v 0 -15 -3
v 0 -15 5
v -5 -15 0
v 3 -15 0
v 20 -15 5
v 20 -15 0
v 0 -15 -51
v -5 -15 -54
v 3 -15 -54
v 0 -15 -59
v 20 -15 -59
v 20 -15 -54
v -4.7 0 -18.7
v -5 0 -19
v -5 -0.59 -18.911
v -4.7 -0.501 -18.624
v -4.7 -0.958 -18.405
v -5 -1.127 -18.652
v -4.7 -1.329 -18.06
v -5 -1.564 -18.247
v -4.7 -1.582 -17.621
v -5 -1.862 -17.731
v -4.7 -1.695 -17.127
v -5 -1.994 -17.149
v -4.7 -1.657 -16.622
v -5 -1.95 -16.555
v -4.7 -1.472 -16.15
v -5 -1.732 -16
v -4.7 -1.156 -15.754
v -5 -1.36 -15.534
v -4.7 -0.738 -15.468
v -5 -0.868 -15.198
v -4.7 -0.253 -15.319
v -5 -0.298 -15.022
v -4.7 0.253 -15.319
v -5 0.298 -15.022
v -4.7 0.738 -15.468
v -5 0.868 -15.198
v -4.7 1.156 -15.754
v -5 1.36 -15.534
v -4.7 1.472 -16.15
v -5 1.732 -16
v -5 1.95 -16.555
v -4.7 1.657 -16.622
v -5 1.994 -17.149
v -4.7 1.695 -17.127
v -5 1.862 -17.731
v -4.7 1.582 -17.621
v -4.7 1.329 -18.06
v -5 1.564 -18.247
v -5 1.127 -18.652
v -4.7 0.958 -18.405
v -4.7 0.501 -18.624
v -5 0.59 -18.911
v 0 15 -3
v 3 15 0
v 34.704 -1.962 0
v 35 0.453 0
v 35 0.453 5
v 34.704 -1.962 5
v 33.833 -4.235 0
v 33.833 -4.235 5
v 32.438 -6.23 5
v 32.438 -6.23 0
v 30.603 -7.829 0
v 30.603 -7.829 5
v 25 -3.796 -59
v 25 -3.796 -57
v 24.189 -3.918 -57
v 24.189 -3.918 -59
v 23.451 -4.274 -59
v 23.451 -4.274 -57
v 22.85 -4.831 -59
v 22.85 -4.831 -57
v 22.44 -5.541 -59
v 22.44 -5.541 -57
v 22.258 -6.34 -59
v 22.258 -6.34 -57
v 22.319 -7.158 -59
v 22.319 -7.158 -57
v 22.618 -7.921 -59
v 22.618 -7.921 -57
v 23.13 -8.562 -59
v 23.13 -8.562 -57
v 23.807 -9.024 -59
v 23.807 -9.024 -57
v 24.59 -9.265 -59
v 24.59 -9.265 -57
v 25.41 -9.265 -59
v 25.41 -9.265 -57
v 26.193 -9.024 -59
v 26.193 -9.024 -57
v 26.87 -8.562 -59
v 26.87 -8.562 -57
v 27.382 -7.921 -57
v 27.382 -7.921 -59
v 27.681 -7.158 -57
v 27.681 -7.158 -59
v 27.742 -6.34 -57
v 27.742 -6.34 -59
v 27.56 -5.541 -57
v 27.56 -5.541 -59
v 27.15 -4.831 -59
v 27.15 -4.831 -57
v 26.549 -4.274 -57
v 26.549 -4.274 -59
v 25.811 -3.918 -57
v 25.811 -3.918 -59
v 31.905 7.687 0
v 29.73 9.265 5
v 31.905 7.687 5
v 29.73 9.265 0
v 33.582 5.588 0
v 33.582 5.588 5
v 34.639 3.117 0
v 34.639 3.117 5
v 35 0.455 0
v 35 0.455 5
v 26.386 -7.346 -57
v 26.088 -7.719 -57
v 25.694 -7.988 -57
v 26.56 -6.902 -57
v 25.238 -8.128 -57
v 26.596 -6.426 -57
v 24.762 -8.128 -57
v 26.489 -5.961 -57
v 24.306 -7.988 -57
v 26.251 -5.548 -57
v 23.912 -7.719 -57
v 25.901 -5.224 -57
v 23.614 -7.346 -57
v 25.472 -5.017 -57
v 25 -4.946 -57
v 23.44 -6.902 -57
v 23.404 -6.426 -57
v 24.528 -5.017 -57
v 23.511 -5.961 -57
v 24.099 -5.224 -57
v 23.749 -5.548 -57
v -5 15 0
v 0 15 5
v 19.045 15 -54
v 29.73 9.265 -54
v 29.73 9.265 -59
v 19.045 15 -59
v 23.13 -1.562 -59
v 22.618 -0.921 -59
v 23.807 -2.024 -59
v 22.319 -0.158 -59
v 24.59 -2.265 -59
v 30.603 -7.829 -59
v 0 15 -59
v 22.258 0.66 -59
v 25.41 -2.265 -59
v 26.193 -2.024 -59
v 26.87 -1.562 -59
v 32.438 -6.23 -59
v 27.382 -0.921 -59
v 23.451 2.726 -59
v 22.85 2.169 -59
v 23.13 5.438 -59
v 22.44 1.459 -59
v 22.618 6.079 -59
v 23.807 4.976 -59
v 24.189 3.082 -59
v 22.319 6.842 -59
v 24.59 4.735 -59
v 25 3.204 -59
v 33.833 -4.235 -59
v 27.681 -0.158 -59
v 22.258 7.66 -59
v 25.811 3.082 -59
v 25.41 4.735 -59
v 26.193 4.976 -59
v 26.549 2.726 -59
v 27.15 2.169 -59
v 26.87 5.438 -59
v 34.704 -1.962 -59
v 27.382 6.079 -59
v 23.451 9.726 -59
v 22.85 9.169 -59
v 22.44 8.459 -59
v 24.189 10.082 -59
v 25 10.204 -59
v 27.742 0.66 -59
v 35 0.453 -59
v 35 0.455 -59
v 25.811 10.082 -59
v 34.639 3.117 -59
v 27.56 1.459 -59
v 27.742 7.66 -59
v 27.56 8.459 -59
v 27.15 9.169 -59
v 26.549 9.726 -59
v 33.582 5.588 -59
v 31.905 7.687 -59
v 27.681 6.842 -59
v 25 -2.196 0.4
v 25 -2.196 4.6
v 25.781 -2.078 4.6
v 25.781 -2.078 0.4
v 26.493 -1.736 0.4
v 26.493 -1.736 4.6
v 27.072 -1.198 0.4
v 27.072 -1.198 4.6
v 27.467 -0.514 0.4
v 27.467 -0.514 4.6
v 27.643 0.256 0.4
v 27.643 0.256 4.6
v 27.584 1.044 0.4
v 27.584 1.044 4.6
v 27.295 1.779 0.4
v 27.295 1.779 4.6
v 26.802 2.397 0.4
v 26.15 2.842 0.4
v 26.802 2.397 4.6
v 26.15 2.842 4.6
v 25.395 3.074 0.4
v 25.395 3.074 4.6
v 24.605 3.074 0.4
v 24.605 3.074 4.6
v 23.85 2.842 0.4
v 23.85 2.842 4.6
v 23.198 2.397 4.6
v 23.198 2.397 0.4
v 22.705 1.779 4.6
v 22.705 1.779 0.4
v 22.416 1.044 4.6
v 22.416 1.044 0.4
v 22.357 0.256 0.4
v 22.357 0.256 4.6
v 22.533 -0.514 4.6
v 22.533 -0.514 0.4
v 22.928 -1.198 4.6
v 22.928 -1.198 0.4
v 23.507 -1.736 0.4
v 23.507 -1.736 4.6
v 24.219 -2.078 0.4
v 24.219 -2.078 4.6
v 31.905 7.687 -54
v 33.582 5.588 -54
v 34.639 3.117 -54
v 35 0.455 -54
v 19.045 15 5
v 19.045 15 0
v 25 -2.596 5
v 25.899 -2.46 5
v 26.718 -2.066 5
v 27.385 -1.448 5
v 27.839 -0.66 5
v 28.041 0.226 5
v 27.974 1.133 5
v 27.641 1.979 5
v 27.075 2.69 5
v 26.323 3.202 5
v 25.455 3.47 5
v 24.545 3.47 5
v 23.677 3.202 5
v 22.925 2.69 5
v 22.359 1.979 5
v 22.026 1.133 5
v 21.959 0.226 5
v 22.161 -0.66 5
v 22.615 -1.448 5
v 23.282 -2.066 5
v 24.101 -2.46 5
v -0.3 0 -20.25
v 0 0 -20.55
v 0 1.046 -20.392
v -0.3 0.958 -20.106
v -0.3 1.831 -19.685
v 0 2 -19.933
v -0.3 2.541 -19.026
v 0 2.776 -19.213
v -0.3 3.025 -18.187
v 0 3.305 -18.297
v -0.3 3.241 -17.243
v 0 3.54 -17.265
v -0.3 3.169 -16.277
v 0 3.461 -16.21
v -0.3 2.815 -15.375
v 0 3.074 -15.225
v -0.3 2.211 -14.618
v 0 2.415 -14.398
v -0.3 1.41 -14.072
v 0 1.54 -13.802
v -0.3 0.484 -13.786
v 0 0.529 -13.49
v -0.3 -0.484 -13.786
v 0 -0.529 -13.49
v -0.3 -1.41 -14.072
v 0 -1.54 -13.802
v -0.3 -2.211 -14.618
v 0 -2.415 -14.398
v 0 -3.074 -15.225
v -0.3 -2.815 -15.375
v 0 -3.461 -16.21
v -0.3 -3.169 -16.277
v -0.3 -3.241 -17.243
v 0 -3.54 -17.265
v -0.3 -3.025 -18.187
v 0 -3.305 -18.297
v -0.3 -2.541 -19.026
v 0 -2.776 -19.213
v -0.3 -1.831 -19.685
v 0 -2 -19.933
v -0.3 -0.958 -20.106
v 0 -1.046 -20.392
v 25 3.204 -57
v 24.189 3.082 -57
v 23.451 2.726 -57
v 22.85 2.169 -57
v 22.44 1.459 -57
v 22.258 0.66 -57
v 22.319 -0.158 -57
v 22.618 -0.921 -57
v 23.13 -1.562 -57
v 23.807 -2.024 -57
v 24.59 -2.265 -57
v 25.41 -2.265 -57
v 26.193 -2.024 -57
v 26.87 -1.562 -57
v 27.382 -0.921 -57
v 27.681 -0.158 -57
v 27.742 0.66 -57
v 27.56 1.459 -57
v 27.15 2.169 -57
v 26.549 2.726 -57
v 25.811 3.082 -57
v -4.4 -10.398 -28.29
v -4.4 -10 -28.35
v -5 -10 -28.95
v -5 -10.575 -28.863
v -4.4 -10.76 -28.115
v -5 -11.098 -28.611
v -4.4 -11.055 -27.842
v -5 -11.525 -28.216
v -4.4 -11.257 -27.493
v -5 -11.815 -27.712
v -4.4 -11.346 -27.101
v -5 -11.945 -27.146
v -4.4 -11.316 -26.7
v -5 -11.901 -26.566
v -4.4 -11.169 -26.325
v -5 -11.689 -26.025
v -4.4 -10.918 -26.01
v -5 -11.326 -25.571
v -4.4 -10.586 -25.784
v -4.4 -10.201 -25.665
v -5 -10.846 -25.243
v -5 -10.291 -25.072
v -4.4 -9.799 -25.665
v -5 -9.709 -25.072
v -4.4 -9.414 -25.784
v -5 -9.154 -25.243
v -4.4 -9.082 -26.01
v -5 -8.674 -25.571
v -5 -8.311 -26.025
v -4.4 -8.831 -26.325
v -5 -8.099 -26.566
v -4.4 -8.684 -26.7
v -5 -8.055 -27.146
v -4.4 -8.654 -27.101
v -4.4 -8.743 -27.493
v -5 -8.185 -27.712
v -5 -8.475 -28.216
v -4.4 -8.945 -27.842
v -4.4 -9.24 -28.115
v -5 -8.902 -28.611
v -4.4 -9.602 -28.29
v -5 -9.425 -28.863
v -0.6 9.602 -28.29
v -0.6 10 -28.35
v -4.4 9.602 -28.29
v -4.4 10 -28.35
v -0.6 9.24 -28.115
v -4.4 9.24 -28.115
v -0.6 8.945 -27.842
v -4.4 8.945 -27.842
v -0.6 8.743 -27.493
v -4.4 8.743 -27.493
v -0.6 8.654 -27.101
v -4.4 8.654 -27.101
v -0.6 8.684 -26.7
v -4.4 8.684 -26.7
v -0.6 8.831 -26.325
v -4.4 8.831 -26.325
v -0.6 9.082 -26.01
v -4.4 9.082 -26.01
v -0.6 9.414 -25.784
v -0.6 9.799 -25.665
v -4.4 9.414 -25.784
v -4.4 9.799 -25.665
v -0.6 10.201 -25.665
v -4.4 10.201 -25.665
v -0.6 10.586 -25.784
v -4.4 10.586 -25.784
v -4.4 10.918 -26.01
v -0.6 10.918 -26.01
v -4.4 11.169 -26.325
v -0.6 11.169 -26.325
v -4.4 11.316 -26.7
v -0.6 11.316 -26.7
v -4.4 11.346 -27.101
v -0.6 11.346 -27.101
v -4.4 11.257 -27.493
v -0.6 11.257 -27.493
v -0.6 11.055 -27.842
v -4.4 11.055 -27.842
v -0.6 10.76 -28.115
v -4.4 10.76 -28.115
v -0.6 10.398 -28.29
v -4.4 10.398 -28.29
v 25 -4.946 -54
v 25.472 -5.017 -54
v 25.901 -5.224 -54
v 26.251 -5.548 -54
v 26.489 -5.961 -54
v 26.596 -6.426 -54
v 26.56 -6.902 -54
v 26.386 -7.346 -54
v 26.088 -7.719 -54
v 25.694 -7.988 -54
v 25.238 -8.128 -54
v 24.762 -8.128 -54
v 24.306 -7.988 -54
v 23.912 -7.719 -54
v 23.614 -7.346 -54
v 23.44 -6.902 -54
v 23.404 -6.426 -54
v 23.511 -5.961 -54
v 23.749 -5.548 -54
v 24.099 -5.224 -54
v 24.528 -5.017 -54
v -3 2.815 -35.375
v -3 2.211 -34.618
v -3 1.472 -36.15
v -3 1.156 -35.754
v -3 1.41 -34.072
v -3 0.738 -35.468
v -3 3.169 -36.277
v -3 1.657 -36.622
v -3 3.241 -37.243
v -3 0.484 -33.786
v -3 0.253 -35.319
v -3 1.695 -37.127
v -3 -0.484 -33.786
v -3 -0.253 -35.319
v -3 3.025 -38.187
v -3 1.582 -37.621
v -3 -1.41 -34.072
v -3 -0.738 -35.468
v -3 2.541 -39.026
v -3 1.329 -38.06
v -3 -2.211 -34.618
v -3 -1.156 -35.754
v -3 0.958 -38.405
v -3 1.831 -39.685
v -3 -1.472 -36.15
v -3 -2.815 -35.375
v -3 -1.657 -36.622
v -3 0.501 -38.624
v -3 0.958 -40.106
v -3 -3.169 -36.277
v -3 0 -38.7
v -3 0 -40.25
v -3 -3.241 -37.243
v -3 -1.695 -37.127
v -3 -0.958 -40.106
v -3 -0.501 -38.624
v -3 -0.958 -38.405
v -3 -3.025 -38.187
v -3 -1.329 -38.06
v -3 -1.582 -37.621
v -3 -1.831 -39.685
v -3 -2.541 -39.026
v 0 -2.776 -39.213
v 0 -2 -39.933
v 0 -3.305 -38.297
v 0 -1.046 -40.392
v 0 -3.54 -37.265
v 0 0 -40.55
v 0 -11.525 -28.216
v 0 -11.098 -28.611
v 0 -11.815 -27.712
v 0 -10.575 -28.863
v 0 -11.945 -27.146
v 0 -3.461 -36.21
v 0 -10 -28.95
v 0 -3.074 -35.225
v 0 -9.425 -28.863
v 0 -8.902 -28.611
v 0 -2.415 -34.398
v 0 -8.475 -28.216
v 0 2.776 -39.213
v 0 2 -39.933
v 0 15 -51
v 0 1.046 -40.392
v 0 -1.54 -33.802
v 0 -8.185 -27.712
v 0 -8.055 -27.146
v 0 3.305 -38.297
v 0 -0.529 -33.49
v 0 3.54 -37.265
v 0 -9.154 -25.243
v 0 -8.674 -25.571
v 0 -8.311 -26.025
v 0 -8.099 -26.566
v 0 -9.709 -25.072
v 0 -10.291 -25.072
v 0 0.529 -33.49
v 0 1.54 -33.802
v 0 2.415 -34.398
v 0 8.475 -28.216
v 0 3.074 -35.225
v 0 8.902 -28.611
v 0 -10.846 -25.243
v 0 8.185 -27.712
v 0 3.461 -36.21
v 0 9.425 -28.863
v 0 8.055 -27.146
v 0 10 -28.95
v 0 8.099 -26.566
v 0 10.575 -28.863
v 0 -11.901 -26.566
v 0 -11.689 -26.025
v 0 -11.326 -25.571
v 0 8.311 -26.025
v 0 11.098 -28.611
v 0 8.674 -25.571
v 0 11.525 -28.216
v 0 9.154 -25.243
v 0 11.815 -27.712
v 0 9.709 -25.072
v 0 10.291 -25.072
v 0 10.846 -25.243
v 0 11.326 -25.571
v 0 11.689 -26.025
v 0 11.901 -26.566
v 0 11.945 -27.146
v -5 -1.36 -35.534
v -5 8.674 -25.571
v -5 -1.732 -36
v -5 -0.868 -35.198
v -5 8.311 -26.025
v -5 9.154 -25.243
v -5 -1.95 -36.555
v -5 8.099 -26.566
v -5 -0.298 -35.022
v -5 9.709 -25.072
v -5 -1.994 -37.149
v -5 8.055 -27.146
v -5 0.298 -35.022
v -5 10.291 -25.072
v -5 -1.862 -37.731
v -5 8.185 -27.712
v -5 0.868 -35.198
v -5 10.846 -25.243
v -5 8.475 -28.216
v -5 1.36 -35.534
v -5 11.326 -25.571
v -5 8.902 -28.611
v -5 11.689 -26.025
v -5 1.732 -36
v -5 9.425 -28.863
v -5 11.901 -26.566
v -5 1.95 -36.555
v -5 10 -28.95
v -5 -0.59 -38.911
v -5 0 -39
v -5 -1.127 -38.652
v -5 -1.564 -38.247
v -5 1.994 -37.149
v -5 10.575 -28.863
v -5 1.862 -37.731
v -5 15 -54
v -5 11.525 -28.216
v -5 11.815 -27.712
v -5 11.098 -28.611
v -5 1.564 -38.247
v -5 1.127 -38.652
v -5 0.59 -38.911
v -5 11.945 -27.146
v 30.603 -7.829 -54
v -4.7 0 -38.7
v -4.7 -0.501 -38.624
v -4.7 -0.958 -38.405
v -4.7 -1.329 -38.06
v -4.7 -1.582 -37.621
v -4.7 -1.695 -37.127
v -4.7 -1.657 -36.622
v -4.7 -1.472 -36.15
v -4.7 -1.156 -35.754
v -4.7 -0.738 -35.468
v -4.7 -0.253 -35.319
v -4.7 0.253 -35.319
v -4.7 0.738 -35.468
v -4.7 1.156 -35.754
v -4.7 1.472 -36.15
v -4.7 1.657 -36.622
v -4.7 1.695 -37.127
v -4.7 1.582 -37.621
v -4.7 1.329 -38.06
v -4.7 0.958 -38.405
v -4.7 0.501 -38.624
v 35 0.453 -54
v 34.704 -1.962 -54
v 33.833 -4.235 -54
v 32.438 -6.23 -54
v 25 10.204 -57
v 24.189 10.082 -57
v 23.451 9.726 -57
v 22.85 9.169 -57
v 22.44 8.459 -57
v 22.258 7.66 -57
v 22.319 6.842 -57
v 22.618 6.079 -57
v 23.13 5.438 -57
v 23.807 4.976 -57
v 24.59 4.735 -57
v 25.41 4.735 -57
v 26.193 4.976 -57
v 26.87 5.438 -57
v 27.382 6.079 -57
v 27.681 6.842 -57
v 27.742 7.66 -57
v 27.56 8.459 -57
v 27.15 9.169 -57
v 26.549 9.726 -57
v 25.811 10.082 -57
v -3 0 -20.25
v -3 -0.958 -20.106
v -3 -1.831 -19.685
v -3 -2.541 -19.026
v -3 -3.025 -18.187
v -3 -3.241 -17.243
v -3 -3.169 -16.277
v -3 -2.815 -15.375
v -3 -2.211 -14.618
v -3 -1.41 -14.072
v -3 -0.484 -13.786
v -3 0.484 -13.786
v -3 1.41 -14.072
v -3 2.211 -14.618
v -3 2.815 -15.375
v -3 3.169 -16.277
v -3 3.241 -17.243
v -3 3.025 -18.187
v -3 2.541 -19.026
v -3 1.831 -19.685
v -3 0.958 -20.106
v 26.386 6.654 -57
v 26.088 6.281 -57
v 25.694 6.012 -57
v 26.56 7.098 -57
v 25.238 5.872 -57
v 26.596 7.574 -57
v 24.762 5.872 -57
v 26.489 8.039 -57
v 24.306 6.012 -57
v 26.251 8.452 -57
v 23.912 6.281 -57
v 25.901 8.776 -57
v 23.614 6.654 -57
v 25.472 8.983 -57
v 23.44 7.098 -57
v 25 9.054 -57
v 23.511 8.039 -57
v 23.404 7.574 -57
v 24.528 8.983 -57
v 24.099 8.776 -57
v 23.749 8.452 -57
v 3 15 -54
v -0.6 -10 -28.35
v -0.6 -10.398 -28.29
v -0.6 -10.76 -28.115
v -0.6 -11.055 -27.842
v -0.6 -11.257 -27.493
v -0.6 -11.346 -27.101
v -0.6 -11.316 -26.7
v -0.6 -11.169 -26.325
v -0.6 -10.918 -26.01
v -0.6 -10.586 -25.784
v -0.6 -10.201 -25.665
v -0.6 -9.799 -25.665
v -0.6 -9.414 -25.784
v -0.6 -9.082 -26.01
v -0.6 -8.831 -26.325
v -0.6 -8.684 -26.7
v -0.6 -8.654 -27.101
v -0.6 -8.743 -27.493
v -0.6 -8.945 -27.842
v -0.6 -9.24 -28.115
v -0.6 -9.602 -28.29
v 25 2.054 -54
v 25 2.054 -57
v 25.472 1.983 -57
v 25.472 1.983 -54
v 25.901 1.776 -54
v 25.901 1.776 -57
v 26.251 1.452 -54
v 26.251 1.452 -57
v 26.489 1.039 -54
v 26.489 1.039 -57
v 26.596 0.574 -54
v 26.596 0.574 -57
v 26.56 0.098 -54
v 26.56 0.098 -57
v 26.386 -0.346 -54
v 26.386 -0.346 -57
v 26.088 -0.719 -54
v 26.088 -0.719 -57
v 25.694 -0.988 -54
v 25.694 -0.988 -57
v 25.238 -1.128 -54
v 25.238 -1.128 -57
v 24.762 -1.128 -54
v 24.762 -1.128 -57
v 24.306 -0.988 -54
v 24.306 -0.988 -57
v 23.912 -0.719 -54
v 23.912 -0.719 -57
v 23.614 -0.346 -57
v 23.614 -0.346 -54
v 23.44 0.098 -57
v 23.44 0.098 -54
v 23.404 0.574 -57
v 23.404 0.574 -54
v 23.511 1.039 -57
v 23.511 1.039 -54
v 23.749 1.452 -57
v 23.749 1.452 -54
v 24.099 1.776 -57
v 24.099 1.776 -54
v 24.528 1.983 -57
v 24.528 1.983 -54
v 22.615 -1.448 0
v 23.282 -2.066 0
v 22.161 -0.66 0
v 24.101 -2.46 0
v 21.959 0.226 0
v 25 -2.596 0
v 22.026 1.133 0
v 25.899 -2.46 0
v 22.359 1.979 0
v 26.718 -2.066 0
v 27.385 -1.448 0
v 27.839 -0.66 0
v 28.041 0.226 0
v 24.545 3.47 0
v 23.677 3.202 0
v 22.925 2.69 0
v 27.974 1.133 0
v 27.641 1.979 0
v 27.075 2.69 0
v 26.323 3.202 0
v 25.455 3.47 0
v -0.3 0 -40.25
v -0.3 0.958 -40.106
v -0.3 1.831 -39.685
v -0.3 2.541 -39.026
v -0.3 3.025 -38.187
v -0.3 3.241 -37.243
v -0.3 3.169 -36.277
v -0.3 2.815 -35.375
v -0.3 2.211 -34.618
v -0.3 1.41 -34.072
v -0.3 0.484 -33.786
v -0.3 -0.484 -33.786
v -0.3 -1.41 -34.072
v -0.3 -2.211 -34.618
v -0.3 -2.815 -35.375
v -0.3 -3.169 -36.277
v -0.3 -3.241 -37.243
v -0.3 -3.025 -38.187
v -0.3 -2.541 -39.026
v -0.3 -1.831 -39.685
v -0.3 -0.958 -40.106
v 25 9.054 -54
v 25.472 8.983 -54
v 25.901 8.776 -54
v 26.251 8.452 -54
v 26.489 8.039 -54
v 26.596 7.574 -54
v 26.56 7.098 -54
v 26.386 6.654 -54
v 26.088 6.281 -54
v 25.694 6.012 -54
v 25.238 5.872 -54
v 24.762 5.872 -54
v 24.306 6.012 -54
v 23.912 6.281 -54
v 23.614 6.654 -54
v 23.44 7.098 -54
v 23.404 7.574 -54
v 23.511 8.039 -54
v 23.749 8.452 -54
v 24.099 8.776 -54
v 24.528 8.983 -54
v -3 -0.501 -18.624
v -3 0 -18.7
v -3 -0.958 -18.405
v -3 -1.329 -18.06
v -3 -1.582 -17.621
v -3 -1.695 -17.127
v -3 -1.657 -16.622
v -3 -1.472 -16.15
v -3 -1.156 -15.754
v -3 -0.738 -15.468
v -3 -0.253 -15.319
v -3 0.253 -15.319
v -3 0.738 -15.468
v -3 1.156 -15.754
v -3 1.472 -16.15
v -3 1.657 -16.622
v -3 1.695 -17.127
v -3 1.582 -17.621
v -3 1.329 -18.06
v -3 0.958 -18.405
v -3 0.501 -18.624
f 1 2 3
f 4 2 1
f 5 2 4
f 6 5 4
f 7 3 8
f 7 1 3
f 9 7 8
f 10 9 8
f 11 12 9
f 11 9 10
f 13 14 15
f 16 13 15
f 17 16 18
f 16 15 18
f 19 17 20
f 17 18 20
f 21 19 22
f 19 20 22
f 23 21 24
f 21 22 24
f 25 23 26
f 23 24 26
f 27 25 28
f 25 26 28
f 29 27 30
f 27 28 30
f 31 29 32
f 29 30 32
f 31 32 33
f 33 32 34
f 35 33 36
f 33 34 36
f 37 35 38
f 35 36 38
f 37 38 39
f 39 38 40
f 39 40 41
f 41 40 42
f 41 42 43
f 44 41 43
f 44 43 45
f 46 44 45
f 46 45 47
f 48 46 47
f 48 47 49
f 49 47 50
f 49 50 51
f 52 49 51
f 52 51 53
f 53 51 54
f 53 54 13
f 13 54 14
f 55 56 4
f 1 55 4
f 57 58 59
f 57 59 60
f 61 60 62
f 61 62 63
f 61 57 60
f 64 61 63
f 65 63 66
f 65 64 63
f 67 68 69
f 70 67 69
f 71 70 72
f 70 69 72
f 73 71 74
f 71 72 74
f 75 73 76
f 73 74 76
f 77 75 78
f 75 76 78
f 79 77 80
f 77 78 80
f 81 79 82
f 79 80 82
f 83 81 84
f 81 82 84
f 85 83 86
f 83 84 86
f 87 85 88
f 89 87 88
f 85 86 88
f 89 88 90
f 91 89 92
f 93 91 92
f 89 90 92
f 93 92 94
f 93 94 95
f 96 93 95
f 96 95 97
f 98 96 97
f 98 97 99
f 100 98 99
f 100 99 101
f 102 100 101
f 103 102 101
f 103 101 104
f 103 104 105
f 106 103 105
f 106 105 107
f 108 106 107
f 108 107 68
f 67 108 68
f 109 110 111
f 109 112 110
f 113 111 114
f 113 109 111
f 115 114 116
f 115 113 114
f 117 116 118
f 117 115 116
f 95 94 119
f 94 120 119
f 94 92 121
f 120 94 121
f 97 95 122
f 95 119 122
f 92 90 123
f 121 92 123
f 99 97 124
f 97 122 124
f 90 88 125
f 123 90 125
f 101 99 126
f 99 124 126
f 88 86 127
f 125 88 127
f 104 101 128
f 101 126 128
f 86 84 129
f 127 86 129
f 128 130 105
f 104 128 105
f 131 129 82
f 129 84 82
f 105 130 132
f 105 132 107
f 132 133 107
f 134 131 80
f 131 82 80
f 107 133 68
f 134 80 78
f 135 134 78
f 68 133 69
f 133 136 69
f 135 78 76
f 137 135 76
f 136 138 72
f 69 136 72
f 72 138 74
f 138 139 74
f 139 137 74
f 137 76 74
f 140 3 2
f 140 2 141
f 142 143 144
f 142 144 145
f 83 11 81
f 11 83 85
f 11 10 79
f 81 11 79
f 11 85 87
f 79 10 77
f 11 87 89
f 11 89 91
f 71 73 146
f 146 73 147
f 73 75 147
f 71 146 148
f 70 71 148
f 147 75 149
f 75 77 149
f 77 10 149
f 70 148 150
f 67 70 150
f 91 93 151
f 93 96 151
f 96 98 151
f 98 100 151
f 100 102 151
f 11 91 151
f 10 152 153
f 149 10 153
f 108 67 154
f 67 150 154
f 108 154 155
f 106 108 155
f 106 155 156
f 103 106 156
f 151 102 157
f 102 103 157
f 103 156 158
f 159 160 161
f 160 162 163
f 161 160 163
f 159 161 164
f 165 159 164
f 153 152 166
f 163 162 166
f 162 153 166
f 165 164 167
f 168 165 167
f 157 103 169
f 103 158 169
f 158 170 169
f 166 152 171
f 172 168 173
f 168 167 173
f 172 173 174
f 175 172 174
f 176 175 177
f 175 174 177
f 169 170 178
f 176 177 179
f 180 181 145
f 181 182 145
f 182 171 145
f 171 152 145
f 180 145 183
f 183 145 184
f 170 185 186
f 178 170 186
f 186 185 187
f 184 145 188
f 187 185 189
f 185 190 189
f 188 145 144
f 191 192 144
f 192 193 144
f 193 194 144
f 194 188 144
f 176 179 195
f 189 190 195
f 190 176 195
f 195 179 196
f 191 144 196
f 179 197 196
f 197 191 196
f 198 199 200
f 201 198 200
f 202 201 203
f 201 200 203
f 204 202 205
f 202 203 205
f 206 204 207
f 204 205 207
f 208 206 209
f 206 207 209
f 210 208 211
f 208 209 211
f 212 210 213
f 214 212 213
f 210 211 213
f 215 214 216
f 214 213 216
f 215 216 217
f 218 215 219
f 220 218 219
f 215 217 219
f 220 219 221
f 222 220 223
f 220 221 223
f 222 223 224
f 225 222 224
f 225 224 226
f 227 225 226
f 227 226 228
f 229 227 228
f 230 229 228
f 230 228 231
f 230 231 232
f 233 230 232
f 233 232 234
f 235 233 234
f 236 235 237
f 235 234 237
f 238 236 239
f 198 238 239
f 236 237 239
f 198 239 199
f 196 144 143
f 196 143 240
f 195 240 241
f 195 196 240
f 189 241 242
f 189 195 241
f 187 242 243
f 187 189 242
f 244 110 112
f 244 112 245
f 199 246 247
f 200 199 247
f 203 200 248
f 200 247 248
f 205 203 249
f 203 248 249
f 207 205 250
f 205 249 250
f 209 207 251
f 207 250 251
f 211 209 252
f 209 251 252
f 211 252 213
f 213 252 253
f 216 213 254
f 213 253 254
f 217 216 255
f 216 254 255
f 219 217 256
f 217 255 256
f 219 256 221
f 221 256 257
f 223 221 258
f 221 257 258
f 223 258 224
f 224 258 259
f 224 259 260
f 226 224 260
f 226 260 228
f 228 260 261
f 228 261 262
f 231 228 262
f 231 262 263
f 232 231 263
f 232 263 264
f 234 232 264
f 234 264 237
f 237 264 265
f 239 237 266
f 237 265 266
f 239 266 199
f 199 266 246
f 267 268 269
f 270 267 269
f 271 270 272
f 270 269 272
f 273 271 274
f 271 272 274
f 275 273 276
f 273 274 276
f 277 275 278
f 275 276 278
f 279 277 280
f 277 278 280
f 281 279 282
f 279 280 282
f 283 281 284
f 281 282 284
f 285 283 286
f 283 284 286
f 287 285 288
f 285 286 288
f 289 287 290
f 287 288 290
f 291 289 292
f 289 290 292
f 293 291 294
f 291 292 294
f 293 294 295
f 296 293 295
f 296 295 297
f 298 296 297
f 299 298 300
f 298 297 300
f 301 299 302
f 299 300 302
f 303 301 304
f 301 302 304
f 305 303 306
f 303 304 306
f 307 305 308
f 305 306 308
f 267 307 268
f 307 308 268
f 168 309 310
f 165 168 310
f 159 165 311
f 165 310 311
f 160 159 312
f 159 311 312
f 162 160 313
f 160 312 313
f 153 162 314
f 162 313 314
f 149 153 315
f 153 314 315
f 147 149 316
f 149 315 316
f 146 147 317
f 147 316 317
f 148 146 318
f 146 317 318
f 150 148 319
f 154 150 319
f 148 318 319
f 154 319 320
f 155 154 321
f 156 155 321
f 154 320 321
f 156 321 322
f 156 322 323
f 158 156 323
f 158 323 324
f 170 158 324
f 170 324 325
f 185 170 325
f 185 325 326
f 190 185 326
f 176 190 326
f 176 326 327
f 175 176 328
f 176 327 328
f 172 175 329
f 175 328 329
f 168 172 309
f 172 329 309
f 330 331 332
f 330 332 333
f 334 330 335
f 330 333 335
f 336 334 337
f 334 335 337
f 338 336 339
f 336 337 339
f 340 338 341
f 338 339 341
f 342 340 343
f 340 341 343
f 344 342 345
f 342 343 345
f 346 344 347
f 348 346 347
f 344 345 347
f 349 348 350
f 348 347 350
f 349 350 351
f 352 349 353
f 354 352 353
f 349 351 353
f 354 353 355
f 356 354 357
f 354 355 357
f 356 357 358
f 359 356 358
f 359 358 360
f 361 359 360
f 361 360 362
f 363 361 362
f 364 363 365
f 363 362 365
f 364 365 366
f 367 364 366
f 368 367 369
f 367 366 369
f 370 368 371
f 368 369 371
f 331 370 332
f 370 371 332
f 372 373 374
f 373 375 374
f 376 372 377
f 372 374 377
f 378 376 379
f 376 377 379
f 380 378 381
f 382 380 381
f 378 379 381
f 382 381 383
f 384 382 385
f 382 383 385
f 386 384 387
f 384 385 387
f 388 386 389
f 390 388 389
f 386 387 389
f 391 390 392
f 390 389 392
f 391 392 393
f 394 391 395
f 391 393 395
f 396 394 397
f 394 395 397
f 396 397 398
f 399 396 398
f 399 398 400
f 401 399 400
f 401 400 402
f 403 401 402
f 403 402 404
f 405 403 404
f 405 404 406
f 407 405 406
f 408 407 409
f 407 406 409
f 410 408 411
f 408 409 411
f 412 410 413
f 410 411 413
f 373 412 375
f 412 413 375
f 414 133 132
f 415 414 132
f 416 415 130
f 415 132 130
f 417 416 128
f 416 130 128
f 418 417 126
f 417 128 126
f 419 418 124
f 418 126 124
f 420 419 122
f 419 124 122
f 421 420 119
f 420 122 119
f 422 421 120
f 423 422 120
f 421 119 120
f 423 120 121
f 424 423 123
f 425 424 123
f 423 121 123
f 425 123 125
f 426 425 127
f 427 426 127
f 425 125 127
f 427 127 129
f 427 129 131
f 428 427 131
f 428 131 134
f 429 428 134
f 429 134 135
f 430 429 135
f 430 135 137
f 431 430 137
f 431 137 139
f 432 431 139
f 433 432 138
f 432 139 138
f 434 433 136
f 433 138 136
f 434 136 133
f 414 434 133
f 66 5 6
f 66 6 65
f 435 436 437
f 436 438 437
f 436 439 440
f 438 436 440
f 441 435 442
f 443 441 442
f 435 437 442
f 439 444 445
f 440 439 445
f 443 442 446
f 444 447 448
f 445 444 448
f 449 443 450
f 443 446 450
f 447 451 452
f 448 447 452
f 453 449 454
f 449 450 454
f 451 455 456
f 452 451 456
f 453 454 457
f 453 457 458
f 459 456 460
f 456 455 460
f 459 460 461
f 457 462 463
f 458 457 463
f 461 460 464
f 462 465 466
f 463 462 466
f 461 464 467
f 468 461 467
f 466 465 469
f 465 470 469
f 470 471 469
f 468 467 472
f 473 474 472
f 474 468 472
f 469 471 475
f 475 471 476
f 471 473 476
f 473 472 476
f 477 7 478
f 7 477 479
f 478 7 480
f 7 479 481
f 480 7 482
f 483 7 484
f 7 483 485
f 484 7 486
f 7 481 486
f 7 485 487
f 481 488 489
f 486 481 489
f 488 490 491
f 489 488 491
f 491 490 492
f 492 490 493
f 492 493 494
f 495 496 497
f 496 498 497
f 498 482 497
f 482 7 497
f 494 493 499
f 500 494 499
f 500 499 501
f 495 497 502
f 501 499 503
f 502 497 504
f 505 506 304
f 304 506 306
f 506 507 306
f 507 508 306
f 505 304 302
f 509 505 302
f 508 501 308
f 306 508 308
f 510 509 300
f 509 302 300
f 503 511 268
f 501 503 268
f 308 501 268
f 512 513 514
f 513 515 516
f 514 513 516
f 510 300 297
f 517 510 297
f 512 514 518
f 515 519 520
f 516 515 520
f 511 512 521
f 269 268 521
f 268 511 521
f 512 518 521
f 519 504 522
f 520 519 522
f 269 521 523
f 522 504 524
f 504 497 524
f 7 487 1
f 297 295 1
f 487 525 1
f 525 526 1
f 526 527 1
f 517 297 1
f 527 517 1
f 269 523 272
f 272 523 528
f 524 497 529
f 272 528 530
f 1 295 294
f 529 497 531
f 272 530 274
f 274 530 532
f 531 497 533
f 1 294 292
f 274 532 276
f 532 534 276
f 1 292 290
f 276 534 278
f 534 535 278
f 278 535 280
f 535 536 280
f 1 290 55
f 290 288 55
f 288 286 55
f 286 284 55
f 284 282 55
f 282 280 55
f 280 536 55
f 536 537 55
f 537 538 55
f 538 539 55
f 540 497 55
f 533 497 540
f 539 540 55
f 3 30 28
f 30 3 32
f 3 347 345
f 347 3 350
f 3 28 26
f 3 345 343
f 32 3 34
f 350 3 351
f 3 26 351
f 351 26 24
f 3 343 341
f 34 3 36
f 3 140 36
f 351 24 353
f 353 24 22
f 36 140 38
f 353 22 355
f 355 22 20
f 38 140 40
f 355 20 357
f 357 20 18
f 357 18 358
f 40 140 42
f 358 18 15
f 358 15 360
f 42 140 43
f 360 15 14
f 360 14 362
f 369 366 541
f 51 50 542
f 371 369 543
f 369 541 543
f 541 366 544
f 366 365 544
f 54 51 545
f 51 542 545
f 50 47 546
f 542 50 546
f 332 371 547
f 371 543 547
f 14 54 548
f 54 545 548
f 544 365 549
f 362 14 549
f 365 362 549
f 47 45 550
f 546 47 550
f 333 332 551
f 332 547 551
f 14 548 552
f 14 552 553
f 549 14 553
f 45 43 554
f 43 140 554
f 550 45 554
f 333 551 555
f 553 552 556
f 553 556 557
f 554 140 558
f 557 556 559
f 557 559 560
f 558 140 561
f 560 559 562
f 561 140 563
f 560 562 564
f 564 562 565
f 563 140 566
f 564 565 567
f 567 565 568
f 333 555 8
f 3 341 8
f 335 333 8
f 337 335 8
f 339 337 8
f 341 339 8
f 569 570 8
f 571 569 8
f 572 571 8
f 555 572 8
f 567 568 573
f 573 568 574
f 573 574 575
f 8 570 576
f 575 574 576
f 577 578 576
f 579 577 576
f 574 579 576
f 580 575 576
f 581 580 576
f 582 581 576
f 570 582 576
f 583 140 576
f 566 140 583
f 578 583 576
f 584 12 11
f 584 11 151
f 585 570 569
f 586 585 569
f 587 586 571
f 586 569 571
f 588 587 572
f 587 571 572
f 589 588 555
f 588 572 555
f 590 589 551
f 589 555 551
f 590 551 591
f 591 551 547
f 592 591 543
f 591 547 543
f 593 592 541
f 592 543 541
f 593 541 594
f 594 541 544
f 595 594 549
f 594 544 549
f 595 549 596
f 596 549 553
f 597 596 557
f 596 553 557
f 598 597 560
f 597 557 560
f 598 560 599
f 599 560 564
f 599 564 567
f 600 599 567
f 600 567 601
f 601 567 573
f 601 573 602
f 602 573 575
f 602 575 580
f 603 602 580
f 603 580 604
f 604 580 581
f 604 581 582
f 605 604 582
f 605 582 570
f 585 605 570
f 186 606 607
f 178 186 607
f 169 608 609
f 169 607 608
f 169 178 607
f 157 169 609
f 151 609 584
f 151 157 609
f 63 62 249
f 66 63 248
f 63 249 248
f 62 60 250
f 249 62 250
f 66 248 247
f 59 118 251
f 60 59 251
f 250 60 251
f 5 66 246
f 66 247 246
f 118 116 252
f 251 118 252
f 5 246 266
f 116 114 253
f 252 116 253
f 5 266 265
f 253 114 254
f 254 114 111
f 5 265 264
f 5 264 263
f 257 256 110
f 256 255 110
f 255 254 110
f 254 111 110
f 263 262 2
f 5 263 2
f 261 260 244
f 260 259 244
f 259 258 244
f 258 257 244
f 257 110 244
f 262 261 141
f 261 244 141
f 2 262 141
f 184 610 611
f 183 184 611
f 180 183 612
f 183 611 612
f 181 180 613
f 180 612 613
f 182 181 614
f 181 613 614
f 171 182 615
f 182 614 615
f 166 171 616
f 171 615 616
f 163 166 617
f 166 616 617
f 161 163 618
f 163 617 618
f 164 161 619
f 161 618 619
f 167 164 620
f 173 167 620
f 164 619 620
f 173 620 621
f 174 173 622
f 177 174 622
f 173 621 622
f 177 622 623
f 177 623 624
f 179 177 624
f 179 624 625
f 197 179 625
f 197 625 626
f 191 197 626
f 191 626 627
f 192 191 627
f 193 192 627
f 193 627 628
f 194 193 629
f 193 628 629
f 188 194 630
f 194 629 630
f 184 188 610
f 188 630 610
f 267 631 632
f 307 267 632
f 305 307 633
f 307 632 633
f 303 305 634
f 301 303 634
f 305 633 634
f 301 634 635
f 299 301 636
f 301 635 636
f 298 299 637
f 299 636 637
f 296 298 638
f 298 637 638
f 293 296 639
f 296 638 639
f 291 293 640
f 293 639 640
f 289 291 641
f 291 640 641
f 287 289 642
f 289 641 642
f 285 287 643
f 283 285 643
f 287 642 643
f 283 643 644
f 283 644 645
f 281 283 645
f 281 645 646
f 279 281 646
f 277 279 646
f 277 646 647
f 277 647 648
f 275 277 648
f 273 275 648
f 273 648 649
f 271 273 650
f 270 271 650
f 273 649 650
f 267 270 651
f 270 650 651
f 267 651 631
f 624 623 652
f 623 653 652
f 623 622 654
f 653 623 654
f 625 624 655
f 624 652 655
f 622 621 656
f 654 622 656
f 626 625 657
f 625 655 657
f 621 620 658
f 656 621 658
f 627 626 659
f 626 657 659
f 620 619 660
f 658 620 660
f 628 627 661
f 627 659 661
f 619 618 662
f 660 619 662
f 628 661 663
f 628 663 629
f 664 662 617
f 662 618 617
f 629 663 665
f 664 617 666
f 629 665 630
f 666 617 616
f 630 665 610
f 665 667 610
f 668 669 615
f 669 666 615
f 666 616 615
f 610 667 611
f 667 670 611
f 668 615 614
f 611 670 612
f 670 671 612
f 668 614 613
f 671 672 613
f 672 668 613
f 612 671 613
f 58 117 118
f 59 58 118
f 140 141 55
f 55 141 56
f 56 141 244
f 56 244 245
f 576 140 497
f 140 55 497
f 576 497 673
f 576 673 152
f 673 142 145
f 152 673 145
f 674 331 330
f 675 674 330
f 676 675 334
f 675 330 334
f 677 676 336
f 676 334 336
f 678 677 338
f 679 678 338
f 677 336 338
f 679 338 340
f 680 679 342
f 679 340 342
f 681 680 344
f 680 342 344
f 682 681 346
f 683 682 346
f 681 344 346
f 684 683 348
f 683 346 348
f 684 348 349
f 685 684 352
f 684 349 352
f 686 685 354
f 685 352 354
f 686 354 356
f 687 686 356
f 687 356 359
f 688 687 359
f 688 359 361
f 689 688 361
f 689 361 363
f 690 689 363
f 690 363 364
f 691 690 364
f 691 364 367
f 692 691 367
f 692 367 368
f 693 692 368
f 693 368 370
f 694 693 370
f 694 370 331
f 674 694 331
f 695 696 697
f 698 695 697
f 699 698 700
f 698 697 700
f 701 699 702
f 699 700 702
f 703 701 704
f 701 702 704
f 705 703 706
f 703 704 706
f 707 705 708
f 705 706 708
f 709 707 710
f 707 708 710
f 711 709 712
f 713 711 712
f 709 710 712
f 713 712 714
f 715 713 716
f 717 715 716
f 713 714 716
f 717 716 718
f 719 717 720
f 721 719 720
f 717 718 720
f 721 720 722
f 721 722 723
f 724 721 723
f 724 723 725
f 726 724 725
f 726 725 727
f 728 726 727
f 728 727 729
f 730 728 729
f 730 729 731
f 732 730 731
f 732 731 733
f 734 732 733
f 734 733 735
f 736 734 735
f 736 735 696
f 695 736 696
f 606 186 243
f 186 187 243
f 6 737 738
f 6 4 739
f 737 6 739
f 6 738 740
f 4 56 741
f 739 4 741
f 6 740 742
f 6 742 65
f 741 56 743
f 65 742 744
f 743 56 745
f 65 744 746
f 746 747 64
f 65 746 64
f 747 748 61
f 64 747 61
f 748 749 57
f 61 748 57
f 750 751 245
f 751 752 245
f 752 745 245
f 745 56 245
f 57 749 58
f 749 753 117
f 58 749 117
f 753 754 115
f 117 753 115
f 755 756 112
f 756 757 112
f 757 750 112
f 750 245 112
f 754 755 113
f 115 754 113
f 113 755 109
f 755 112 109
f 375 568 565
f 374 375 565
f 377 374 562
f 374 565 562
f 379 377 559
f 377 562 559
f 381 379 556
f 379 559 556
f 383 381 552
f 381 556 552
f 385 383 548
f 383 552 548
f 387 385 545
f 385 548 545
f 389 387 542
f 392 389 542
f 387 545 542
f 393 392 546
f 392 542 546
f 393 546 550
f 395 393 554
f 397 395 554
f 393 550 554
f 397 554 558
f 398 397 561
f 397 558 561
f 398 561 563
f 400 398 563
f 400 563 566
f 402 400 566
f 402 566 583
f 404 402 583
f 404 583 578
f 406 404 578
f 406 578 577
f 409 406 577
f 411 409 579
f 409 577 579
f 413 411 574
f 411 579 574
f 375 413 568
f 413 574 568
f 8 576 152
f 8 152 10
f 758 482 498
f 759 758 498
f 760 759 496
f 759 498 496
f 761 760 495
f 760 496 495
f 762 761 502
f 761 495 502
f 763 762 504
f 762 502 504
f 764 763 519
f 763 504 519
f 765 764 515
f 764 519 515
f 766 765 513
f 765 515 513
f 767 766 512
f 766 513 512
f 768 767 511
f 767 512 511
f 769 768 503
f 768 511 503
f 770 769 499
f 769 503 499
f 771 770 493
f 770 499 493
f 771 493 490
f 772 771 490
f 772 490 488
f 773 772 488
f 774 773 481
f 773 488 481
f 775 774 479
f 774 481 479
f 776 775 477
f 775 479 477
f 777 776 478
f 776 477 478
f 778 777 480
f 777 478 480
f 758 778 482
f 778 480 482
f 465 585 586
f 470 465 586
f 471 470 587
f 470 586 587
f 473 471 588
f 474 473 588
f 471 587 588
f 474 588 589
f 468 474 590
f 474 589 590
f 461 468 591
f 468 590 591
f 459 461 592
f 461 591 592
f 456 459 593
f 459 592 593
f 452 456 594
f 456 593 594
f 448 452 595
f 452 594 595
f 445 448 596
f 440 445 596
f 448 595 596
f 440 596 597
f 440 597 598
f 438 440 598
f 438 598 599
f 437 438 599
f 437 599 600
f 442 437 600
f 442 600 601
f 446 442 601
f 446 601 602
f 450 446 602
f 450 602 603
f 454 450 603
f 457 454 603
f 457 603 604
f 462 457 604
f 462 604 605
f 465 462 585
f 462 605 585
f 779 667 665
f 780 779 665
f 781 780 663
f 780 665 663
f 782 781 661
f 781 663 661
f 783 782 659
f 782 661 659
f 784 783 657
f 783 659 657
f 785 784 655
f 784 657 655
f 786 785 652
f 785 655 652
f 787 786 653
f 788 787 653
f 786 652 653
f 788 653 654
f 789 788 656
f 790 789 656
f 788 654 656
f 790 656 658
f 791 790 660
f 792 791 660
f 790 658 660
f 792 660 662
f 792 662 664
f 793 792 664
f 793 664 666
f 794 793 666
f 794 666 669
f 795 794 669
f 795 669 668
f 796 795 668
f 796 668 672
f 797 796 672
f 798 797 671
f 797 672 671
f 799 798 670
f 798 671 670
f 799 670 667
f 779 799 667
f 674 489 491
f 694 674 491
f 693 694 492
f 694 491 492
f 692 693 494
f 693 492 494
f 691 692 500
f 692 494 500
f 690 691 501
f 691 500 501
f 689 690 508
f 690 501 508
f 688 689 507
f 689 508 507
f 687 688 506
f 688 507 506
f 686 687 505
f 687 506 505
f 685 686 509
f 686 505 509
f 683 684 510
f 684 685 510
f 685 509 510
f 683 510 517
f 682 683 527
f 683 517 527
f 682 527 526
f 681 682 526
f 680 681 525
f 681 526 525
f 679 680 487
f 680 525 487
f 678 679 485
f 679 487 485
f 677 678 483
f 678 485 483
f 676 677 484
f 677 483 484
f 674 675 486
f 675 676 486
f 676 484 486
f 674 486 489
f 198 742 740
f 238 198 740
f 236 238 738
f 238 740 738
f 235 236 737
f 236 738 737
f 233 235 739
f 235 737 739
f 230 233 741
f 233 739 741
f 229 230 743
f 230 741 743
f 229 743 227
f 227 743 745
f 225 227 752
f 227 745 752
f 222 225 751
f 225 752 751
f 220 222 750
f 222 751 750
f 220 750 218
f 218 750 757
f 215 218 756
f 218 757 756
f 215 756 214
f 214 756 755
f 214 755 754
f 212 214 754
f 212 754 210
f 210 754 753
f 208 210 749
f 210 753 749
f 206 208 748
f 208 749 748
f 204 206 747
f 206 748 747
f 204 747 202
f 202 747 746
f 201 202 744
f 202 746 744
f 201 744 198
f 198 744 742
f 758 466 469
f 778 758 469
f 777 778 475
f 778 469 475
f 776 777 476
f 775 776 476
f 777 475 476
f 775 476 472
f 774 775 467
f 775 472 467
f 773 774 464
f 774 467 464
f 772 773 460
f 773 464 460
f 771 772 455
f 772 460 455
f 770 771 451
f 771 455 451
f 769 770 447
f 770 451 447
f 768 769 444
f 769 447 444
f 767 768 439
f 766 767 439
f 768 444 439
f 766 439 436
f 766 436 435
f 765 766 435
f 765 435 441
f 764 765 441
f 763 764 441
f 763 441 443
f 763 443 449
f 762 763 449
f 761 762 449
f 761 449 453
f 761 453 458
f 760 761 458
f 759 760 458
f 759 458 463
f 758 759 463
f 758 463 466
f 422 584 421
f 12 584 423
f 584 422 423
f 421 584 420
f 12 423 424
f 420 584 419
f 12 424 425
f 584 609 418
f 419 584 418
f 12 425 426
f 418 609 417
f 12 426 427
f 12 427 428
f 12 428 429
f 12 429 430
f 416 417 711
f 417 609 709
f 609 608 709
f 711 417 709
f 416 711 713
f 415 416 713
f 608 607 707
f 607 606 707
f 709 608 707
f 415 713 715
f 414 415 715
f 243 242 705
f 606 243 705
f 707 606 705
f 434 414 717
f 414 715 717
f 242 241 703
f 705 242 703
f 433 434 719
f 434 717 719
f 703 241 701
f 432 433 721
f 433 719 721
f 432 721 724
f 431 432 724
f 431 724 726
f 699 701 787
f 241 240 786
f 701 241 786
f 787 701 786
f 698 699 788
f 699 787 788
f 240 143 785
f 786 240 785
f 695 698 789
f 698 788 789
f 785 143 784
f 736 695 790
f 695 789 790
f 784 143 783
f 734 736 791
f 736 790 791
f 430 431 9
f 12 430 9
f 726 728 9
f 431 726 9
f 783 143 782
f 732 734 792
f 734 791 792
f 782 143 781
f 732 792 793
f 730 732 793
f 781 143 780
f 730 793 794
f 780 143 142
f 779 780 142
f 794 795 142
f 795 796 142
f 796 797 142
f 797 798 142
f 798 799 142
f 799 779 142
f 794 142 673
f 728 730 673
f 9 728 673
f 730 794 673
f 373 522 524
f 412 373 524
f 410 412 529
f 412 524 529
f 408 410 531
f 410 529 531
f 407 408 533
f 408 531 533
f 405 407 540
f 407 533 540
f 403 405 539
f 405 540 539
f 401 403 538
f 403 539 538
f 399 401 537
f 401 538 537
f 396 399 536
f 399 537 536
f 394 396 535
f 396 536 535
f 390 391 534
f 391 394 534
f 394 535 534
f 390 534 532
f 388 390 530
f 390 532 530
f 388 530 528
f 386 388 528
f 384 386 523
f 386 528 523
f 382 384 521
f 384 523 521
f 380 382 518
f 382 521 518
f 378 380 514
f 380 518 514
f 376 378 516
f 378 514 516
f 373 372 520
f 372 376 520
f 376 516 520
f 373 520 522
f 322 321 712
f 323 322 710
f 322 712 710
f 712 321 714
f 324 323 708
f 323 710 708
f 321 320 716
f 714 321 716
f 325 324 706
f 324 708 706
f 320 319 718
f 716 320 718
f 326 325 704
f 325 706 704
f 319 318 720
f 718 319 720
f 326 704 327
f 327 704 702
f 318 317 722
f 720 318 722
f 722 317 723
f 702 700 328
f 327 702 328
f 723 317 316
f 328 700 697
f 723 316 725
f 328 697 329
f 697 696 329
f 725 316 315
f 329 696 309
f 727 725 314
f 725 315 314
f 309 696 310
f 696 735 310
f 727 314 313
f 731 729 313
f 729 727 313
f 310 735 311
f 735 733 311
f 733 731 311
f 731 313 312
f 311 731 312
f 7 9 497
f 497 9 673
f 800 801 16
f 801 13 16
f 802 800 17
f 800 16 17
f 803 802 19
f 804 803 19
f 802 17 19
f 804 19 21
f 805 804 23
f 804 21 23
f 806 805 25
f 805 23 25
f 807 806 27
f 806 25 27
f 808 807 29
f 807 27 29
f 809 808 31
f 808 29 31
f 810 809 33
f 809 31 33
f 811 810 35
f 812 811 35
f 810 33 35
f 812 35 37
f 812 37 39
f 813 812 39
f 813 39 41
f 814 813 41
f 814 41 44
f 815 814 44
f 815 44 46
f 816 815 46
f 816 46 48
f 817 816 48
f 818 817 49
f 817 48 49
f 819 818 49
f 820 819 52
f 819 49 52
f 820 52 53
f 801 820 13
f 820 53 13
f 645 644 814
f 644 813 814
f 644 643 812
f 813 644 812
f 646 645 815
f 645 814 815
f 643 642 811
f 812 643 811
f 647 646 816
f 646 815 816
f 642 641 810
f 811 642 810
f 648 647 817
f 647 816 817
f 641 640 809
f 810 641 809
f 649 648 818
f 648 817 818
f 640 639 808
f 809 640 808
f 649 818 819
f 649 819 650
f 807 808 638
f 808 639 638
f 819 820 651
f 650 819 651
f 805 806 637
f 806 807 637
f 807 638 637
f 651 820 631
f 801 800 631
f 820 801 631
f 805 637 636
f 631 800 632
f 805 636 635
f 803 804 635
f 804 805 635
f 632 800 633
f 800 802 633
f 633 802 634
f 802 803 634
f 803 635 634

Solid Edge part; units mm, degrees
sketch "Sketch1" plane through (0, 0, 0) normal (0, -1, 0) x (1, 0, 0)
  line L0 (0, 0) -> (35, 0)
  line L1 (35, 0) -> (35, 5)
  line L2 (35, 5) -> (-5, 5)
  line L3 (-5, 5) -> (-5, -59)
  line L4 (-5, -59) -> (35, -59)
  line L5 (35, -59) -> (35, -54)
  line L6 (35, -54) -> (0, -54)
  line L7 (0, -54) -> (0, 0)
  dimension "D1" = 40
  dimension "D2" = 35
  dimension "D3" = 5
  dimension "D4" = 5
  dimension "D5" = 54
extrude "Protrusion1" add sketch "Sketch1" along normal mid plane 30
sketch "Sketch2" plane through (7.5, 0, 5) normal (0, 0, 1) x (0, 1, 0)
  line L0 (-15, -12.5) -> (-4.8551, -27.5)
  line L1 (-4.8551, -27.5) -> (6.4359, -27.5)
  line L2 (6.4359, -27.5) -> (15, -11.5446)
  line L3 (15, -11.5446) -> (15, -30)
  line L4 (15, -30) -> (-15, -30)
  line L5 (-15, -30) -> (-15, -12.5)
  dimension "D1" = 15
  dimension "D2" = 2.5
  dimension "D3" = 20
extrude "Cutout1" cut sketch "Sketch2" against normal through all
fillet "tip_round" radius 10 4 edges at (35, -4.8551, 2.5) (35, 6.4359, 2.5) (35, -4.8551, -56.5) (35, 6.4359, -56.5)
hole "bearing_hole" at (25, 0.454, 5) direction (0, 0, -1) diameter 5.3 end up to next start chamfer 0.4 start chamfer angle 45 end chamfer 0.4 end chamfer angle 45
hole "Hole_6" at (0, 0, -37) direction (-1, 0, 0) diameter 3.4 depth 30 tip angle 118 counterbore diameter 6.5 counterbore depth 3 start chamfer 0.3 start chamfer angle 45 end chamfer 0.3 end chamfer angle 45
hole "Hole1" at (0, 0, -17) direction (-1, 0, 0) diameter 3.4 depth 30 tip angle 118 counterbore diameter 6.5 counterbore depth 3 start chamfer 0.3 start chamfer angle 45 end chamfer 0.3 end chamfer angle 45
hole "Hole2" at (0, -10, -27) direction (-1, 0, 0) diameter 2.7 depth 30 tip angle 118 start chamfer 0.6 start chamfer angle 45 end chamfer 0.6 end chamfer angle 45
hole "Hole3" at (0, 10, -27) direction (-1, 0, 0) diameter 2.7 depth 30 tip angle 118 start chamfer 0.6 start chamfer angle 45 end chamfer 0.6 end chamfer angle 45
chamfer "core_chamfers" distance 3 angle 45 2 edges at (0, 0, 0) (0, 0, -54)
chamfer "outter_chamfers" distance 5 angle 45 2 edges at (-5, 0, 5) (-5, 0, -59)
hole "Hole4" at (25, 0.454, -59) direction (0, 0, 1) diameter 3.2 end up to next counterbore diameter 5.5 counterbore depth 2
hole "Hole5" at (25, -6.546, -59) direction (0, 0, 1) diameter 3.2 end up to next counterbore diameter 5.5 counterbore depth 2
hole "Hole6" at (25, 7.454, -59) direction (0, 0, 1) diameter 3.2 end up to next counterbore diameter 5.5 counterbore depth 2
properties material "Polypropylene, general purpose"
